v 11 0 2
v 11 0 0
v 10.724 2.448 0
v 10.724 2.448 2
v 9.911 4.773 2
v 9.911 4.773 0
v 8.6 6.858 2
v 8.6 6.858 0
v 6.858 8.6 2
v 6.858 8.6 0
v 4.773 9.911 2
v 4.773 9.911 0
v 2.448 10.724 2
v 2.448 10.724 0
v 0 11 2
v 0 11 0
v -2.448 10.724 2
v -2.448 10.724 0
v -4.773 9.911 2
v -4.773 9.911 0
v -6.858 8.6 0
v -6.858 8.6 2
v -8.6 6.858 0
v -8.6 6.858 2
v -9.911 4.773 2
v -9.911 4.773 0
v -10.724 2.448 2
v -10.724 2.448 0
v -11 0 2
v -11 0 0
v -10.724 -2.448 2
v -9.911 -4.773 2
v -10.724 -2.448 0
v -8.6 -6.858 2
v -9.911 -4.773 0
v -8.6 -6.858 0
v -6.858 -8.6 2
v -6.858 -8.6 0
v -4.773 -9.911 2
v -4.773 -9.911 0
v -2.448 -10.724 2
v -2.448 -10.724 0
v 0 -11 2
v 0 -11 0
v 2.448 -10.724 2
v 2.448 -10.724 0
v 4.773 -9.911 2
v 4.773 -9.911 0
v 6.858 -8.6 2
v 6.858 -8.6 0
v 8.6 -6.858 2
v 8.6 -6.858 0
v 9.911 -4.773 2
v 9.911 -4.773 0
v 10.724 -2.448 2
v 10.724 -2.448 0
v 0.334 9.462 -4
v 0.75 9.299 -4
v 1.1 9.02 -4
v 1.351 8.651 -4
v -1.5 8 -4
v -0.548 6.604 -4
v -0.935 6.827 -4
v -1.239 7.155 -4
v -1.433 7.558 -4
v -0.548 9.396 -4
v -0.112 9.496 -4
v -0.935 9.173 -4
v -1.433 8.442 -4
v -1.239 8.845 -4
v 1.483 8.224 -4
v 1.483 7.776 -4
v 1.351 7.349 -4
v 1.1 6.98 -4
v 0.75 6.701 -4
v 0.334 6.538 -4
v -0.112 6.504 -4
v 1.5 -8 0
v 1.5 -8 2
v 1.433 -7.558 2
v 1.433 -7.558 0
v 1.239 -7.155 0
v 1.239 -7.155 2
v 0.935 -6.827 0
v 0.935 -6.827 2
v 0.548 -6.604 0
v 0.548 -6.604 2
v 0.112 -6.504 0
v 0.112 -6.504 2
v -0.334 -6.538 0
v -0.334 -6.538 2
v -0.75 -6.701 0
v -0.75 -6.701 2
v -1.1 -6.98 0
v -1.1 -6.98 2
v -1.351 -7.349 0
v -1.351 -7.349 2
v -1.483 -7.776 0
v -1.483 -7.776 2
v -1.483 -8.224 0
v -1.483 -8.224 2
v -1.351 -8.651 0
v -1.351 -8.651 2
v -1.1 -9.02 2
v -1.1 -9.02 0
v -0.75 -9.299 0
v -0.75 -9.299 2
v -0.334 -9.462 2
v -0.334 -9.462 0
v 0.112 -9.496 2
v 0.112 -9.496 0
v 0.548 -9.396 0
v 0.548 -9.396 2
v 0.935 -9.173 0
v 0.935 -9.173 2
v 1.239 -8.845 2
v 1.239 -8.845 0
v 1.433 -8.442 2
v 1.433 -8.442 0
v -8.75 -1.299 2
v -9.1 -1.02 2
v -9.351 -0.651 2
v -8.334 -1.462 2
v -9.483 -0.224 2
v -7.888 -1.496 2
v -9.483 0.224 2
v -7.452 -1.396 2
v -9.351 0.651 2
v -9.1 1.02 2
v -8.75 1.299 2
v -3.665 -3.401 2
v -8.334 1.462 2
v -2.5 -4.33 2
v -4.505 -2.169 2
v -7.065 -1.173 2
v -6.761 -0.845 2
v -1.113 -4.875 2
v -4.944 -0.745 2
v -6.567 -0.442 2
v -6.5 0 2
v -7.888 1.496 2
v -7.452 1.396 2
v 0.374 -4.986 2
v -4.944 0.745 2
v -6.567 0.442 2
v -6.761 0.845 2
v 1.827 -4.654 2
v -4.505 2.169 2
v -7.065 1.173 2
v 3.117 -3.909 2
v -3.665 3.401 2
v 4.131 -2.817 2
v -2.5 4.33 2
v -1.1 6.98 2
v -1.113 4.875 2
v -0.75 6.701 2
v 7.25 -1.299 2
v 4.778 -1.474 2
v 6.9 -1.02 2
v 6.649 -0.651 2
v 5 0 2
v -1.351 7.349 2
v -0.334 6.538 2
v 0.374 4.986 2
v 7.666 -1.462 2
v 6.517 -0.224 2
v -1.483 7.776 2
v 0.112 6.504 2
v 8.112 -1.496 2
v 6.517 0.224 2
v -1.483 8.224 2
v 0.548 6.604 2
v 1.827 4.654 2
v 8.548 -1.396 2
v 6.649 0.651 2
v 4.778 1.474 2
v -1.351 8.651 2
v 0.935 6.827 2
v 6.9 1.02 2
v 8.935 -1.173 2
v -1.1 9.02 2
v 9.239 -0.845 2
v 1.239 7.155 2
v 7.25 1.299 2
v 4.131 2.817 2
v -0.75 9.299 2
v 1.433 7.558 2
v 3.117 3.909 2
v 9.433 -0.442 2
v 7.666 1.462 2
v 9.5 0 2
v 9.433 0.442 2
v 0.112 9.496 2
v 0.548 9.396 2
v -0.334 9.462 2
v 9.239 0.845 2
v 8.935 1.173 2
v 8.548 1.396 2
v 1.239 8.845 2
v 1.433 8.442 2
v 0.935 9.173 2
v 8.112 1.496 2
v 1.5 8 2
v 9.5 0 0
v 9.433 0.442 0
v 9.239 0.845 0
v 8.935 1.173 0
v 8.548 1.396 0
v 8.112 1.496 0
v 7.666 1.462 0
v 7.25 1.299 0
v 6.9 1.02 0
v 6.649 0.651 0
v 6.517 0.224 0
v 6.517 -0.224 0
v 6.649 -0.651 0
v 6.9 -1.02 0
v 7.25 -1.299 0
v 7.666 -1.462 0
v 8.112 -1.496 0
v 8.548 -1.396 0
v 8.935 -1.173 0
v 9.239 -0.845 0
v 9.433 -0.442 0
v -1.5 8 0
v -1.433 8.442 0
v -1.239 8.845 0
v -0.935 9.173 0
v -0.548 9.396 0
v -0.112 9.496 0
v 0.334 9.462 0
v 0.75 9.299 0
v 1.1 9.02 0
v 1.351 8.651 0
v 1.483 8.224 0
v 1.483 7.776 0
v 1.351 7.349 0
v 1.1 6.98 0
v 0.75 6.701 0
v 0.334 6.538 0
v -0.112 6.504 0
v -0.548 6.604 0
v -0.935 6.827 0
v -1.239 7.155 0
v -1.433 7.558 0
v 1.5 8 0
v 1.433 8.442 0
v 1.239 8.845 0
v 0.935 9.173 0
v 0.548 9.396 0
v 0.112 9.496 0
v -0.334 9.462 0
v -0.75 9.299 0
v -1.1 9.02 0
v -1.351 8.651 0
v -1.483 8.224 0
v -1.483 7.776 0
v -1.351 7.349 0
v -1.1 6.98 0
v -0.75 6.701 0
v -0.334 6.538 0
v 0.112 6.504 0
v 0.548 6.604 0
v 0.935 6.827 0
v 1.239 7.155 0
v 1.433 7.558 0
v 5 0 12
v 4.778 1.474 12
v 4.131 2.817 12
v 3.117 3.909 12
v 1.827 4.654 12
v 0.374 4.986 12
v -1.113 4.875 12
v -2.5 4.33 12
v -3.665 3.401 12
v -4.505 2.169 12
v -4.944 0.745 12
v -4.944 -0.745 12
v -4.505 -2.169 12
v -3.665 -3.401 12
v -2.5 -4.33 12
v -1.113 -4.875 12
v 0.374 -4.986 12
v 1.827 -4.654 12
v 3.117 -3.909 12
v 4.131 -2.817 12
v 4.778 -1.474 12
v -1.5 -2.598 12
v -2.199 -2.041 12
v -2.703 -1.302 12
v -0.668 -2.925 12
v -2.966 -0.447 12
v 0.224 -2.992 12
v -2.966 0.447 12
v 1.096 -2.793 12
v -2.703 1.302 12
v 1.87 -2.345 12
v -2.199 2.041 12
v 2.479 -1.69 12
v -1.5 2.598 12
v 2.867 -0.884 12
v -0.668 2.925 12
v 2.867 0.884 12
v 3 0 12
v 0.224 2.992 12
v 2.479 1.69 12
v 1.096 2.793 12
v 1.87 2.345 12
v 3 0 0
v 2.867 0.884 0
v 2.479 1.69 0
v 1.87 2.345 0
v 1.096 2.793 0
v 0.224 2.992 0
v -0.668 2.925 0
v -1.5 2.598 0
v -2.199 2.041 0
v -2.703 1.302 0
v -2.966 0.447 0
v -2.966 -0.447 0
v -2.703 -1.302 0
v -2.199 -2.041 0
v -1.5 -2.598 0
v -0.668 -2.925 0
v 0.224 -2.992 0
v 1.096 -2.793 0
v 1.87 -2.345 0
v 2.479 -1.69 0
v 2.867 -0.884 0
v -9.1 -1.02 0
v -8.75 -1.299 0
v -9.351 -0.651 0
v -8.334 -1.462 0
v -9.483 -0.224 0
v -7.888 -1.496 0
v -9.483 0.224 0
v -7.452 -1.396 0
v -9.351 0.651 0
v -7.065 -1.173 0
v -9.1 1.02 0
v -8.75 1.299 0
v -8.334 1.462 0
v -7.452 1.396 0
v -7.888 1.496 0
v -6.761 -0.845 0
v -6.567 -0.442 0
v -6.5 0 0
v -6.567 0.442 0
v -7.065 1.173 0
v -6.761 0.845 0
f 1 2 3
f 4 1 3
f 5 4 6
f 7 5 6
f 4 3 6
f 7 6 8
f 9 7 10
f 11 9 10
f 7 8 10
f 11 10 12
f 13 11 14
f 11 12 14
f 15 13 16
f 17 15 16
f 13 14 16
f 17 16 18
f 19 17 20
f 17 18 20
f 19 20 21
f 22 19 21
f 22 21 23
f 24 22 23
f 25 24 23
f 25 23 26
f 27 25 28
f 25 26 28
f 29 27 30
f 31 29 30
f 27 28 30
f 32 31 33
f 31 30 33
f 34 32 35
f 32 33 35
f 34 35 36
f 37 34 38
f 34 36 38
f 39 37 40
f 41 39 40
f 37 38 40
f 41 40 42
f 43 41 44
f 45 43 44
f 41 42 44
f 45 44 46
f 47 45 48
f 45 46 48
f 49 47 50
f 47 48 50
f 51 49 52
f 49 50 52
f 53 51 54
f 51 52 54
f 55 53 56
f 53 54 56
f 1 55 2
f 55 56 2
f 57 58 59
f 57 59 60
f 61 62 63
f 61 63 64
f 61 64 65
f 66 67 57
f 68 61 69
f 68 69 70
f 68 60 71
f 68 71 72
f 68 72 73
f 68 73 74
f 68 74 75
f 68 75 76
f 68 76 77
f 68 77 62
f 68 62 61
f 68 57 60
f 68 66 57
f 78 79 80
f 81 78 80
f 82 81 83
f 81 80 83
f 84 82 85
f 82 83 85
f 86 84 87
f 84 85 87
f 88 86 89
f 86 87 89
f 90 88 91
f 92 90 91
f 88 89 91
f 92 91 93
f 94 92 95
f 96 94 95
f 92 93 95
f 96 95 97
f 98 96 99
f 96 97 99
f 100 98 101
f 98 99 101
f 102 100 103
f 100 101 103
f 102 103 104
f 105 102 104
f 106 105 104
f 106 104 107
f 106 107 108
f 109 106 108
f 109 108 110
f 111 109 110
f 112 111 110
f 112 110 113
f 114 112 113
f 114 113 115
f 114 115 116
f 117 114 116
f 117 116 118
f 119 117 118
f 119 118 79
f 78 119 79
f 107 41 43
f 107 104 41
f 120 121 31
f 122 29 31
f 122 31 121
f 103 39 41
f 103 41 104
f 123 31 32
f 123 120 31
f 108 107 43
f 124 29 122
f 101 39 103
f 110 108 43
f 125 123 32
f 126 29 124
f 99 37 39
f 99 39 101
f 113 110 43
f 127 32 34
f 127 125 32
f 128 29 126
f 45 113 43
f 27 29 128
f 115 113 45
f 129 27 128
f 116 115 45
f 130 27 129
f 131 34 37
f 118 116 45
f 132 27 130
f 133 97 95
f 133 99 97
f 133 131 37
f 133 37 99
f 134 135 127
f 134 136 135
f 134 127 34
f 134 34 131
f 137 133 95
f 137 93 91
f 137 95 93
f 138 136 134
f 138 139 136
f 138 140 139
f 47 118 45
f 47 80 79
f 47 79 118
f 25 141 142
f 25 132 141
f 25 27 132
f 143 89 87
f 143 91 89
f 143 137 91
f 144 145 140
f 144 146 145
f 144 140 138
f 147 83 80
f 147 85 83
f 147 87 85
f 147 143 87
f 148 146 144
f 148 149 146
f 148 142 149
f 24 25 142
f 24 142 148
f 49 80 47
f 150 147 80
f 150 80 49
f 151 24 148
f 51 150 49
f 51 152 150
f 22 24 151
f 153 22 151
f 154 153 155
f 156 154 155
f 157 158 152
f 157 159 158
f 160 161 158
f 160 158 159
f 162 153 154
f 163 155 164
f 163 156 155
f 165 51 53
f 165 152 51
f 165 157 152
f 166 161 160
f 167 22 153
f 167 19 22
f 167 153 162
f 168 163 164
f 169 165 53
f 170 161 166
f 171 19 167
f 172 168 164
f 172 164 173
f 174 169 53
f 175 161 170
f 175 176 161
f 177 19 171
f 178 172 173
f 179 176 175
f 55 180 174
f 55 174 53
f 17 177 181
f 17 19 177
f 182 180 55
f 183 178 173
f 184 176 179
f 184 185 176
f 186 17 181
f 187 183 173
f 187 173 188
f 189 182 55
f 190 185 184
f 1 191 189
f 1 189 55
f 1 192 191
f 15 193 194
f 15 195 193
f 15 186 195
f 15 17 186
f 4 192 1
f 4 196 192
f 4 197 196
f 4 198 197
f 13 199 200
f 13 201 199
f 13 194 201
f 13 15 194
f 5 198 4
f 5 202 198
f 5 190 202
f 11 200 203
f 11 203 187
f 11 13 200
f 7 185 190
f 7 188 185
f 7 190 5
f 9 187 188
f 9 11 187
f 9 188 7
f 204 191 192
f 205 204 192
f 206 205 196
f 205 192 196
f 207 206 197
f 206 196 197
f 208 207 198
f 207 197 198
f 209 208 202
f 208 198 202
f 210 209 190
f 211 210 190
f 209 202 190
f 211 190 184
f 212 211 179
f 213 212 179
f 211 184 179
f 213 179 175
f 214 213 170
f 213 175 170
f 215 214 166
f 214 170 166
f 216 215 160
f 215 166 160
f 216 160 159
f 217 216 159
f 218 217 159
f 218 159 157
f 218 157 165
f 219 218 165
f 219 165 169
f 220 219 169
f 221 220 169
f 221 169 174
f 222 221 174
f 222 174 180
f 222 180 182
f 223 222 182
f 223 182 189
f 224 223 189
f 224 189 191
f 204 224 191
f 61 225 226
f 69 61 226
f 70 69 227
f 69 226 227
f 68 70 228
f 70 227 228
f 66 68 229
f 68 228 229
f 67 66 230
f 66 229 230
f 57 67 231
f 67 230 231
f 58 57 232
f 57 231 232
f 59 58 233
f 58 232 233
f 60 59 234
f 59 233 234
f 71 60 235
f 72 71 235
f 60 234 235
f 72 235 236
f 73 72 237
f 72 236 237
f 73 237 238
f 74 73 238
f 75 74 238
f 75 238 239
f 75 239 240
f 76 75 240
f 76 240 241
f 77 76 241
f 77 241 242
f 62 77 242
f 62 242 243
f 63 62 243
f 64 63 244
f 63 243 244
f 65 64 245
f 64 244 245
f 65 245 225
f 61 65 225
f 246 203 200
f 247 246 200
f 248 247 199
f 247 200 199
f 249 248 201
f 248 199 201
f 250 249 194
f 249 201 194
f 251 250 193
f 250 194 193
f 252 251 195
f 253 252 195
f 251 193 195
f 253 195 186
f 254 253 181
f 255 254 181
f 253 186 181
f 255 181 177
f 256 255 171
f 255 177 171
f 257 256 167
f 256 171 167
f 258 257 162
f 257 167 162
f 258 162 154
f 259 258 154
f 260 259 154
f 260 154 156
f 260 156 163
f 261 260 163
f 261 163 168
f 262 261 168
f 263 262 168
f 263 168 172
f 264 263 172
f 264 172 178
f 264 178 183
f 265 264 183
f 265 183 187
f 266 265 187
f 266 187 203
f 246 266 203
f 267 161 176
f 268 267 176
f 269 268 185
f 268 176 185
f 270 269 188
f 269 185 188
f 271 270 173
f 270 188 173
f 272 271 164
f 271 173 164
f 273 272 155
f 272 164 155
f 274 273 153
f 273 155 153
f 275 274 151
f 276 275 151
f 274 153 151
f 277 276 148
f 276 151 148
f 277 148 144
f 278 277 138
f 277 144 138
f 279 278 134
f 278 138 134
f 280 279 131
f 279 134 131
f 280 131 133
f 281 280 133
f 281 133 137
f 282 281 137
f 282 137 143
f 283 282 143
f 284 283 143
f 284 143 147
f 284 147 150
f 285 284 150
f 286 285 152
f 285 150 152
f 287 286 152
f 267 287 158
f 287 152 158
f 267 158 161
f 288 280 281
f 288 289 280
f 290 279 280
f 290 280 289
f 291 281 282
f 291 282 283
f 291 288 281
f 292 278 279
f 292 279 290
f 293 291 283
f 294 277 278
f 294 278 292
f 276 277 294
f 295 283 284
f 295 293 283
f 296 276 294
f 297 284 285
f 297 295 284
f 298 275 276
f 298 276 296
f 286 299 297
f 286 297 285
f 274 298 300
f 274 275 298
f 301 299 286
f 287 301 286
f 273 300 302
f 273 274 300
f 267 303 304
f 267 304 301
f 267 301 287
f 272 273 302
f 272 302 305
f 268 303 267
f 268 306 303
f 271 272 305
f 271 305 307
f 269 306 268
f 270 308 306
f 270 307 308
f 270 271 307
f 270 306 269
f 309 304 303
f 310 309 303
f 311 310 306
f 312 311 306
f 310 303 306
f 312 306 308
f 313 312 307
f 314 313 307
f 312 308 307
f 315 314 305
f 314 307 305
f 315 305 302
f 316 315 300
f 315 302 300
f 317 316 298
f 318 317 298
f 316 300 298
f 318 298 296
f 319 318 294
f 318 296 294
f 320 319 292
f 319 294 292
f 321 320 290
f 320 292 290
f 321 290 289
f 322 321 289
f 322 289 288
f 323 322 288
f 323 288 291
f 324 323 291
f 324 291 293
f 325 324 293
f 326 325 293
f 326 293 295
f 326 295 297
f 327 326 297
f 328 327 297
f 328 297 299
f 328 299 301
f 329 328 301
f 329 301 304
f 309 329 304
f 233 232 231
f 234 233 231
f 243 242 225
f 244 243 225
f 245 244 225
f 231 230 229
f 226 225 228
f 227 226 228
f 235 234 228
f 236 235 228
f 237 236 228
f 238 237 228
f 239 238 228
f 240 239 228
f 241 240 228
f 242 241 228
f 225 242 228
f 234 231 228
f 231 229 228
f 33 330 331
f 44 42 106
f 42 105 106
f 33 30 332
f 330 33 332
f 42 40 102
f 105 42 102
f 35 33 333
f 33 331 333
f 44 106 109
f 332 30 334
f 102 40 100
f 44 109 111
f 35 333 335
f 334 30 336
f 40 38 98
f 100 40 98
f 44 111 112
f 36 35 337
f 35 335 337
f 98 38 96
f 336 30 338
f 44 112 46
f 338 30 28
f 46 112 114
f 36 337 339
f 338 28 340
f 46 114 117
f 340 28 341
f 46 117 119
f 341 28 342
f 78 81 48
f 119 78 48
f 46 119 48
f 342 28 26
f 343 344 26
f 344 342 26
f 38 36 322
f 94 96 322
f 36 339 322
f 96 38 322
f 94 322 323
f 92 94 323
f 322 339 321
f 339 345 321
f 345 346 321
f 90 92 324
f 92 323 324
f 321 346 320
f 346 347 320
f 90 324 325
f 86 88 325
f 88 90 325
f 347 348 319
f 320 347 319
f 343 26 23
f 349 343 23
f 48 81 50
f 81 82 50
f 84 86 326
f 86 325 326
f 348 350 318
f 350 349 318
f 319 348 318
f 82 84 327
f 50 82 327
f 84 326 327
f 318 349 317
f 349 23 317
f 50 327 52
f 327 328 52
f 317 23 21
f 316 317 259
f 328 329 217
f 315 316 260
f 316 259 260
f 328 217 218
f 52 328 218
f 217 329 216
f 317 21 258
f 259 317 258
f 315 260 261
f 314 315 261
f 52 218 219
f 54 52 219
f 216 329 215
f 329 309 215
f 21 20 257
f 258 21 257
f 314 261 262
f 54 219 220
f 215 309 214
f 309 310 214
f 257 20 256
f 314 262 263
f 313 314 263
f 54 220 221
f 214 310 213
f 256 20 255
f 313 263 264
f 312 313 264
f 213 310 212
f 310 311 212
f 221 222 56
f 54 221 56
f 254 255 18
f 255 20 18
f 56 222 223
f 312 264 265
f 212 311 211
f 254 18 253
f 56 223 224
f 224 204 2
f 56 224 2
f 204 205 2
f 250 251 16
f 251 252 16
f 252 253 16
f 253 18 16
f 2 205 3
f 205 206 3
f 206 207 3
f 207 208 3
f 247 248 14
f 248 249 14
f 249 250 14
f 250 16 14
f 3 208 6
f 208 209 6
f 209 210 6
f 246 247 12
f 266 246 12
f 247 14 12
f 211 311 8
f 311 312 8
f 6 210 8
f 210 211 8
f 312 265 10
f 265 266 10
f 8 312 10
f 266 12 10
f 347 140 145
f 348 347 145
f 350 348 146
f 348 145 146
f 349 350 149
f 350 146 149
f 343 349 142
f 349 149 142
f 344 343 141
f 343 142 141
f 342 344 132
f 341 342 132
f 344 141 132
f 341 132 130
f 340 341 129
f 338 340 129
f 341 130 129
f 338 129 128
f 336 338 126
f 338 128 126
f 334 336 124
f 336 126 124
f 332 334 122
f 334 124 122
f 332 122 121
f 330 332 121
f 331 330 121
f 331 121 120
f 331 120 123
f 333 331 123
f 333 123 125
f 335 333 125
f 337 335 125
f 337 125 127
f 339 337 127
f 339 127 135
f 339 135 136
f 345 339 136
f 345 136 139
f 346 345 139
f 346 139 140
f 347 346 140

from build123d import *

# Parameters (mm, degrees)
SKETCH_1_R          = 11
EXTRUDE_1_DEPTH     = 2
SKETCH_2_R          = 5
EXTRUDE_2_DEPTH     = 10
SKETCH_4_R          = 3
CUT_EXTRUDE_2_DEPTH = 13
CUT_EXTRUDE_3_REACH = 4
SKETCH_5_R          = 1.5
SKETCH_6_R          = 1.5
EXTRUDE_3_DEPTH     = 4


with BuildPart() as part:
    # 草图1 → 凸台-拉伸1 (new body)
    with BuildSketch(Plane.XY):
        Circle(SKETCH_1_R)
    extrude(amount=EXTRUDE_1_DEPTH)

    # 草图2 → 凸台-拉伸2 (add)
    with BuildSketch(Plane.XY.offset(2)):
        Circle(SKETCH_2_R)
    extrude(amount=EXTRUDE_2_DEPTH)

    # 草图4 → 切除-拉伸2 (cut, through all)
    with BuildSketch(Plane.XY.offset(12)):
        Circle(SKETCH_4_R)
    extrude(amount=-CUT_EXTRUDE_2_DEPTH, mode=Mode.SUBTRACT)

    # 草图5 → 切除-拉伸3 (cut, up to next)
    with BuildSketch(Plane.XY.offset(2), mode=Mode.PRIVATE) as cut_extrude_3_sk1:
        with Locations((-8, 0)):
            Circle(SKETCH_5_R)
    cut_extrude_3_tool1 = extrude(cut_extrude_3_sk1.sketch, amount=-CUT_EXTRUDE_3_REACH, mode=Mode.PRIVATE) & part.part
    add(cut_extrude_3_tool1.solids().sort_by_distance((-8, 0, 2))[0], mode=Mode.SUBTRACT)
    # 草图5 → 切除-拉伸3 (cut, up to next)
    with BuildSketch(Plane.XY.offset(2), mode=Mode.PRIVATE) as cut_extrude_3_sk2:
        with Locations((0, 8)):
            Circle(SKETCH_5_R)
    cut_extrude_3_tool2 = extrude(cut_extrude_3_sk2.sketch, amount=-CUT_EXTRUDE_3_REACH, mode=Mode.PRIVATE) & part.part
    add(cut_extrude_3_tool2.solids().sort_by_distance((0, 8, 2))[0], mode=Mode.SUBTRACT)
    # 草图5 → 切除-拉伸3 (cut, up to next)
    with BuildSketch(Plane.XY.offset(2), mode=Mode.PRIVATE) as cut_extrude_3_sk3:
        with Locations((8, 0)):
            Circle(SKETCH_5_R)
    cut_extrude_3_tool3 = extrude(cut_extrude_3_sk3.sketch, amount=-CUT_EXTRUDE_3_REACH, mode=Mode.PRIVATE) & part.part
    add(cut_extrude_3_tool3.solids().sort_by_distance((8, 0, 2))[0], mode=Mode.SUBTRACT)
    # 草图5 → 切除-拉伸3 (cut, up to next)
    with BuildSketch(Plane.XY.offset(2), mode=Mode.PRIVATE) as cut_extrude_3_sk4:
        with Locations((0, -8)):
            Circle(SKETCH_5_R)
    cut_extrude_3_tool4 = extrude(cut_extrude_3_sk4.sketch, amount=-CUT_EXTRUDE_3_REACH, mode=Mode.PRIVATE) & part.part
    add(cut_extrude_3_tool4.solids().sort_by_distance((0, -8, 2))[0], mode=Mode.SUBTRACT)


with BuildPart() as body_2:
    # 草图6 → 凸台-拉伸3 (new body)
    with BuildSketch(Plane(origin=(0, 0, 0), x_dir=(-1, 0, 0), z_dir=(0, 0, -1))):
        with Locations((0, 8)):
            Circle(SKETCH_6_R)
    extrude(amount=EXTRUDE_3_DEPTH)


solid = Compound([part.part, body_2.part])
